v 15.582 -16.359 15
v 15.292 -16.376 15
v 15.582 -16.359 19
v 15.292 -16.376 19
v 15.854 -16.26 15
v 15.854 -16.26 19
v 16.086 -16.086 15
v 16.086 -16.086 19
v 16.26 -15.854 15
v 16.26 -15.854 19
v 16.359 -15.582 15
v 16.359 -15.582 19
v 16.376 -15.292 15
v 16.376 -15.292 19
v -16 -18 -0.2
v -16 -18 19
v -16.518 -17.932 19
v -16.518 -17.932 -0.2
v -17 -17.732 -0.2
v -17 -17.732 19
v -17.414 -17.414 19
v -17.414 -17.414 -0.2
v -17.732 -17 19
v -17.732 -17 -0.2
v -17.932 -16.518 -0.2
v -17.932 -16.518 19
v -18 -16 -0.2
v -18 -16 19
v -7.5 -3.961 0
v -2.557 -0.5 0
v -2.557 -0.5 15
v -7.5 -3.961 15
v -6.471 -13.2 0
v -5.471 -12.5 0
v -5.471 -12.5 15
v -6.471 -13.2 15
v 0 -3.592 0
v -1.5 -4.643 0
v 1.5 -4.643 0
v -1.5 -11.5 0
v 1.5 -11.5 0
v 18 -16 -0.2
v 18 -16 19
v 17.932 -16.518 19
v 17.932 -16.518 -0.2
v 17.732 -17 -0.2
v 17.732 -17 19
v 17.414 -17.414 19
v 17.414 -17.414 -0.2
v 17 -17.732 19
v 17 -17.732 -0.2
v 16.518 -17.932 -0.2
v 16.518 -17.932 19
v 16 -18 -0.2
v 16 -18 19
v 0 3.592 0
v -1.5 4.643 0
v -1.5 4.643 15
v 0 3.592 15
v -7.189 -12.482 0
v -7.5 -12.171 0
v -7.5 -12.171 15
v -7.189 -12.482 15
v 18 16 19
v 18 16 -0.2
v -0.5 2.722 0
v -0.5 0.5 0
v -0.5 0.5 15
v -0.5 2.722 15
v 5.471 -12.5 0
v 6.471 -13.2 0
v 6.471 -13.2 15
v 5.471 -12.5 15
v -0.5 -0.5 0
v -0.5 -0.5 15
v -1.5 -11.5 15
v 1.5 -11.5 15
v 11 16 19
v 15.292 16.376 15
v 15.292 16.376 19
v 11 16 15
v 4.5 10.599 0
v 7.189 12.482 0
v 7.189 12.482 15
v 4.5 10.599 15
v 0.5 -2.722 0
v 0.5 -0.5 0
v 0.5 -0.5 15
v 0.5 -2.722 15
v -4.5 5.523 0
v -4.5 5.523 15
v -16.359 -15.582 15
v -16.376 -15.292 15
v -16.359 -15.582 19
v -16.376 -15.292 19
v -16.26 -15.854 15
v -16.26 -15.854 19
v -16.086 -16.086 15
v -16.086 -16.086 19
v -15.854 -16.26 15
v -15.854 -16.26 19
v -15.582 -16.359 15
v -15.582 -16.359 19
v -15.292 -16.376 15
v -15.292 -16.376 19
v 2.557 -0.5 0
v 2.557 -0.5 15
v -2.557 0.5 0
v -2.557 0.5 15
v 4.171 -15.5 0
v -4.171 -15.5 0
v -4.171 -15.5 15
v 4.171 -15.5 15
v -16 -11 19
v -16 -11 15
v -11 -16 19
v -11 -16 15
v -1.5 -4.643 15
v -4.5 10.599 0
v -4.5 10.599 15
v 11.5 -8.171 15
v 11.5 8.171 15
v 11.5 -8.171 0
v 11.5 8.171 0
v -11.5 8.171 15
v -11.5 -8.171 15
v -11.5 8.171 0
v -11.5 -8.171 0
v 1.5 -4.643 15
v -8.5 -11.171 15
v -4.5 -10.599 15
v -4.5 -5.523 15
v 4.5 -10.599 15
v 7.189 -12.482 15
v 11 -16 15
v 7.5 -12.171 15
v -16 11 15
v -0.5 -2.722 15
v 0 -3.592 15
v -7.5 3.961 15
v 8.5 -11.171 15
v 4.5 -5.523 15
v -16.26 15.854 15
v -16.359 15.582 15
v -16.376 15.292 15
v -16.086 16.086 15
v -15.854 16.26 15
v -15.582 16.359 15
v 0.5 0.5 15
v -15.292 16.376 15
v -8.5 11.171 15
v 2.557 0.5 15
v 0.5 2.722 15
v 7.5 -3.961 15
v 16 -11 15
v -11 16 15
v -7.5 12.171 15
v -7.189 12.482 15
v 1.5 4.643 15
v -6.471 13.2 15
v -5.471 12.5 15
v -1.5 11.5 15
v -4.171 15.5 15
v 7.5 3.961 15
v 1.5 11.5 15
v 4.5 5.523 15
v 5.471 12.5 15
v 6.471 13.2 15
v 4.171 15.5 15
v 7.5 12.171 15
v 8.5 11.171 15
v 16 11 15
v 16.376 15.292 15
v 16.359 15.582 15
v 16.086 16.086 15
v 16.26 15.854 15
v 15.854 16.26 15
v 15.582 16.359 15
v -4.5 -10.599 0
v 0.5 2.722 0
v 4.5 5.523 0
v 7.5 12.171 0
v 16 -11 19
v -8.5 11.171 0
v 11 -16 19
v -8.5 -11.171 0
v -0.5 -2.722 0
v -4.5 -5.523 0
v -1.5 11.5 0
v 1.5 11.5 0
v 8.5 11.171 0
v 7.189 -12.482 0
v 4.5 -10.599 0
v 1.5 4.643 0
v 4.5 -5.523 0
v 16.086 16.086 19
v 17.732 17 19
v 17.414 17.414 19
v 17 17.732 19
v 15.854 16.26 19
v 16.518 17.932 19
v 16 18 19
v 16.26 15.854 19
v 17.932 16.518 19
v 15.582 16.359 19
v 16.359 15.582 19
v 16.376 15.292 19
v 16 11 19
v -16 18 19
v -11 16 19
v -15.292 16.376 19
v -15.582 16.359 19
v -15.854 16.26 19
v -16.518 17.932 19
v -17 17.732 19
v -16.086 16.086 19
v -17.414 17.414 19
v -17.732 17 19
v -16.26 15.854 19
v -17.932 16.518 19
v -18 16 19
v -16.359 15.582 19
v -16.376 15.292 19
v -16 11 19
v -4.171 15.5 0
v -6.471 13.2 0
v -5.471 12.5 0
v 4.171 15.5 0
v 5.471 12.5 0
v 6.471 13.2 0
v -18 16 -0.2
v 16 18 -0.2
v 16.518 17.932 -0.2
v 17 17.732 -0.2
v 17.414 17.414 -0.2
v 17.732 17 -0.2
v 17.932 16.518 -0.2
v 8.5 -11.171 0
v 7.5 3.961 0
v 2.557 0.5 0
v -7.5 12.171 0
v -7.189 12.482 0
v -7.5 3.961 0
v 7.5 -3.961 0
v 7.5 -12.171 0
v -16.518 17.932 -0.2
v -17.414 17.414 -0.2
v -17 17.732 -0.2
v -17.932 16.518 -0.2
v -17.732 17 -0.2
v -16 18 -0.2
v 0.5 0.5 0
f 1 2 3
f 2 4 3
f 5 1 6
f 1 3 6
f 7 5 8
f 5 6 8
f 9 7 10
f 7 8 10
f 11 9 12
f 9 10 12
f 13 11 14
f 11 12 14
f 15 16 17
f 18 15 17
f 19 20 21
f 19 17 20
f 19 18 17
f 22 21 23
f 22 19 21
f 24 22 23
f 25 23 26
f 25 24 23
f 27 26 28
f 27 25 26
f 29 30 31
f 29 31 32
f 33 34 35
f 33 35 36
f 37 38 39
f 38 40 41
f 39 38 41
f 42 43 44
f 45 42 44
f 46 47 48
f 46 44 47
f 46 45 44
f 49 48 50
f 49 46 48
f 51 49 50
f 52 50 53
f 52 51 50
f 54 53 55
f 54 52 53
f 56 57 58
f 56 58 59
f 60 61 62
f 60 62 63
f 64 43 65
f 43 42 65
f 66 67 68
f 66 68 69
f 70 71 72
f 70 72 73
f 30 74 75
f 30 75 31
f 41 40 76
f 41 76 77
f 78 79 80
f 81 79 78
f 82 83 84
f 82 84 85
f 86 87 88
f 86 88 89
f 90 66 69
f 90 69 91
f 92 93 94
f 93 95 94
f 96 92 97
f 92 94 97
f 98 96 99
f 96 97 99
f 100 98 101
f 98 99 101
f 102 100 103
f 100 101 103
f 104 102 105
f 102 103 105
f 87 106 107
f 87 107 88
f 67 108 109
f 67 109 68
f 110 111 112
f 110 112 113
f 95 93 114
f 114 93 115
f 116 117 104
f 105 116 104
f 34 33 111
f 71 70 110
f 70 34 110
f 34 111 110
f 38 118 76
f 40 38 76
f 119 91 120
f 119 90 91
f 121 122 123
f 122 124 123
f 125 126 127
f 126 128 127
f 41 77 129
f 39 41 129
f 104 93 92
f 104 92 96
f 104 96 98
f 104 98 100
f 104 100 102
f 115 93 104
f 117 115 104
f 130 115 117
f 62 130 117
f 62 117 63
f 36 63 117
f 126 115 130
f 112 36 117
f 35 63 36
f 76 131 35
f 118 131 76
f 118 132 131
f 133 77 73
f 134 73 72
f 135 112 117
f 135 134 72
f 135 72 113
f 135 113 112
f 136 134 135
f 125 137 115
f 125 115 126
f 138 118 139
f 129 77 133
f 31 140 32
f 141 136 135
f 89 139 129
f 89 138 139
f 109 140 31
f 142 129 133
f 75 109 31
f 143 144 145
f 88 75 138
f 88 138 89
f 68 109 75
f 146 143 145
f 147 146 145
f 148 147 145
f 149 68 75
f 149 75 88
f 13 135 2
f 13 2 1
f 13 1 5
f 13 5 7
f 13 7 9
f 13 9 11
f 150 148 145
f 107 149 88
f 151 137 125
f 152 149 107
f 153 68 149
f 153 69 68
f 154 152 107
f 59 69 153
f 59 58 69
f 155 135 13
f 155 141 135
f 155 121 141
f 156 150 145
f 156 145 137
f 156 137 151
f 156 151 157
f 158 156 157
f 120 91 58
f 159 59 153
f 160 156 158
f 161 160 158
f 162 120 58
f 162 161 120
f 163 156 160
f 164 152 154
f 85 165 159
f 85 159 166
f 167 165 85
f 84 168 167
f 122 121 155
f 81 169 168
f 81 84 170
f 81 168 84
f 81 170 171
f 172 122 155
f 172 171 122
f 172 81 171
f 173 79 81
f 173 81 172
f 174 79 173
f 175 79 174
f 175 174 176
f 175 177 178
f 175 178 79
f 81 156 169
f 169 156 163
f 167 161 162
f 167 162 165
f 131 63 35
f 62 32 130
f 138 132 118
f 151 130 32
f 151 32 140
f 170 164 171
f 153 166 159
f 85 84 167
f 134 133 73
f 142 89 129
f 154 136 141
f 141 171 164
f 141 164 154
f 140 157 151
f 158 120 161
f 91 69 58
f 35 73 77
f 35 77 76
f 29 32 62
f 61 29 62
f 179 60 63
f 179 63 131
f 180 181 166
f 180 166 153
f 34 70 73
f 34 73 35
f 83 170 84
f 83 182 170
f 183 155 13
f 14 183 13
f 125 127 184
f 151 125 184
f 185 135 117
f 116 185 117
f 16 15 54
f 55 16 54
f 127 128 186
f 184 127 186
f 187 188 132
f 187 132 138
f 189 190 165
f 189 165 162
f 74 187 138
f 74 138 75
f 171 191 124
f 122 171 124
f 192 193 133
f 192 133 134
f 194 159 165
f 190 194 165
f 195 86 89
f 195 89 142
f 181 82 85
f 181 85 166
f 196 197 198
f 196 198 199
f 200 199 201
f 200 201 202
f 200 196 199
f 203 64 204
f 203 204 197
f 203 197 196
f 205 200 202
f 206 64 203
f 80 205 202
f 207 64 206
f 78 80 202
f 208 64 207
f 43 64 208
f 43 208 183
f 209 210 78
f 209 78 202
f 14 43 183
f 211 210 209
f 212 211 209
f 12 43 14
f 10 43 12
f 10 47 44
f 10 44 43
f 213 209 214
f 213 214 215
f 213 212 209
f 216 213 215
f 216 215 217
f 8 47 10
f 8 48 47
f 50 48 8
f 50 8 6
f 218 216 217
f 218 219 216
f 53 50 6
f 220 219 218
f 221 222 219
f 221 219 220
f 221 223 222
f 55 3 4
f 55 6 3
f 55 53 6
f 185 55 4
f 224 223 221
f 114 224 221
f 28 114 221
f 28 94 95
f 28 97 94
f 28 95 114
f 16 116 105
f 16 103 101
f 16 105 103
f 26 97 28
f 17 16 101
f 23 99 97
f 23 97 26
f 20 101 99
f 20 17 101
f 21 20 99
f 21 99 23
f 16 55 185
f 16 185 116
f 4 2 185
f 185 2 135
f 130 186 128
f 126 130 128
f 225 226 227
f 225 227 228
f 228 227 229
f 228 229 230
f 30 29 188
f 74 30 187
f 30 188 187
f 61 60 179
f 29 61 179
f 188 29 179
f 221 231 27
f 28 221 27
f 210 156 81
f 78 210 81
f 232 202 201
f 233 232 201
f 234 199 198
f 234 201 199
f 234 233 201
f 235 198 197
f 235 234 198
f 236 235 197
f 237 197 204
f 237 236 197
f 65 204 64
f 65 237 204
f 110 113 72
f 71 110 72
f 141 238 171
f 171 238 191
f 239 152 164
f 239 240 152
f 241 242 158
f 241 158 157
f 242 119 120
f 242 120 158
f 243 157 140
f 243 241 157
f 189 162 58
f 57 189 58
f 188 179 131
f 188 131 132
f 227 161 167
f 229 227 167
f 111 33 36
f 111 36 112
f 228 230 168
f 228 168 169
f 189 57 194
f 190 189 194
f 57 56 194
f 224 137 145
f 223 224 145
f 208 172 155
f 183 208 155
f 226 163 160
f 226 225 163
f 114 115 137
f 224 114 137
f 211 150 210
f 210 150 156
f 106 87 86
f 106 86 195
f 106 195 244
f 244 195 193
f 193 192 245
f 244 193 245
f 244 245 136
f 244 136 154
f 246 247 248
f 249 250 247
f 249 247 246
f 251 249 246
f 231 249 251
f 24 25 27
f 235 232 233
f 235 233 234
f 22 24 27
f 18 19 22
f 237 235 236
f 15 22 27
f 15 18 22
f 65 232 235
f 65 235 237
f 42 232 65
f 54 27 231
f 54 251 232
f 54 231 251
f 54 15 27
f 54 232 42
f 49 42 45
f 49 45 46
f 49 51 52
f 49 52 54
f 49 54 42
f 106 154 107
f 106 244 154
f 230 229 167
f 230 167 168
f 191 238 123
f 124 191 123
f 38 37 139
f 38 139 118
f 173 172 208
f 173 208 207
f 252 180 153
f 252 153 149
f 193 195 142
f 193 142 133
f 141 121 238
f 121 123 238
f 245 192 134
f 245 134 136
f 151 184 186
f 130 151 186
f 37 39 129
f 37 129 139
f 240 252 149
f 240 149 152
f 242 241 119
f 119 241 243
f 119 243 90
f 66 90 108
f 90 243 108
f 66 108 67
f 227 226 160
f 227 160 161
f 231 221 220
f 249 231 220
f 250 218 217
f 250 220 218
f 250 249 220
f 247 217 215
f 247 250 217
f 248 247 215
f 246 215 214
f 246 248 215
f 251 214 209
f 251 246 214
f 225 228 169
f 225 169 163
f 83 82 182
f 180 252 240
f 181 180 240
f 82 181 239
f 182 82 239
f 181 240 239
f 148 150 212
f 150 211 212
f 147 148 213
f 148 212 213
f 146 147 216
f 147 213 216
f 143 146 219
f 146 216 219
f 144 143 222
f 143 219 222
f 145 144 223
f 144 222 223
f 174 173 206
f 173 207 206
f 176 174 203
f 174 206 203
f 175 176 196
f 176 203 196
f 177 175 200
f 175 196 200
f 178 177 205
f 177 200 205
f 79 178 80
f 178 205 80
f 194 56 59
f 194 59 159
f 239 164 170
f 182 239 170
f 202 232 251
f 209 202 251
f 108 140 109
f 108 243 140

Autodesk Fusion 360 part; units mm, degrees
sketch "8x8_led_matrix_display" plane through (0, 0, 0) normal (0, 0, 1) x (1, 0, 0)
  circle A0 centre (-14, 14) radius 1.5
  circle A1 centre (-10, 14) radius 1.5
  circle A2 centre (-6, 14) radius 1.5
  circle A3 centre (-2, 14) radius 1.5
  circle A4 centre (2, 14) radius 1.5
  circle A5 centre (6, 14) radius 1.5
  circle A6 centre (10, 14) radius 1.5
  circle A7 centre (14, 14) radius 1.5
  circle A8 centre (-14, 10) radius 1.5
  circle A9 centre (-10, 10) radius 1.5
  circle A10 centre (-6, 10) radius 1.5
  circle A11 centre (-2, 10) radius 1.5
  circle A12 centre (2, 10) radius 1.5
  circle A13 centre (6, 10) radius 1.5
  circle A14 centre (10, 10) radius 1.5
  circle A15 centre (14, 10) radius 1.5
  circle A16 centre (-14, 6) radius 1.5
  circle A17 centre (-10, 6) radius 1.5
  circle A18 centre (-6, 6) radius 1.5
  circle A19 centre (-2, 6) radius 1.5
  circle A20 centre (2, 6) radius 1.5
  circle A21 centre (6, 6) radius 1.5
  circle A22 centre (10, 6) radius 1.5
  circle A23 centre (14, 6) radius 1.5
  circle A24 centre (-14, 2) radius 1.5
  circle A25 centre (-10, 2) radius 1.5
  circle A26 centre (-6, 2) radius 1.5
  circle A27 centre (-2, 2) radius 1.5
  circle A28 centre (2, 2) radius 1.5
  circle A29 centre (6, 2) radius 1.5
  circle A30 centre (10, 2) radius 1.5
  circle A31 centre (14, 2) radius 1.5
  circle A32 centre (-14, -2) radius 1.5
  circle A33 centre (-10, -2) radius 1.5
  circle A34 centre (-6, -2) radius 1.5
  circle A35 centre (-2, -2) radius 1.5
  circle A36 centre (2, -2) radius 1.5
  circle A37 centre (6, -2) radius 1.5
  circle A38 centre (10, -2) radius 1.5
  circle A39 centre (14, -2) radius 1.5
  circle A40 centre (-14, -6) radius 1.5
  circle A41 centre (-10, -6) radius 1.5
  circle A42 centre (-6, -6) radius 1.5
  circle A43 centre (-2, -6) radius 1.5
  circle A44 centre (2, -6) radius 1.5
  circle A45 centre (6, -6) radius 1.5
  circle A46 centre (10, -6) radius 1.5
  circle A47 centre (14, -6) radius 1.5
  circle A48 centre (-14, -10) radius 1.5
  circle A49 centre (-10, -10) radius 1.5
  circle A50 centre (-6, -10) radius 1.5
  circle A51 centre (-2, -10) radius 1.5
  circle A52 centre (2, -10) radius 1.5
  circle A53 centre (6, -10) radius 1.5
  circle A54 centre (10, -10) radius 1.5
  circle A55 centre (14, -10) radius 1.5
  circle A56 centre (-14, -14) radius 1.5
  circle A57 centre (-10, -14) radius 1.5
  circle A58 centre (-6, -14) radius 1.5
  circle A59 centre (-2, -14) radius 1.5
  circle A60 centre (2, -14) radius 1.5
  circle A61 centre (6, -14) radius 1.5
  circle A62 centre (10, -14) radius 1.5
  circle A63 centre (14, -14) radius 1.5
  line L0 (16, -16) -> (-16, -16)
  line L1 (-16, -16) -> (-16, 16)
  line L2 (-16, 16) -> (16, 16)
  line L3 (16, 16) -> (16, -16)
  line L4 (16, -16) -> (-16, 16) construction
  line L5 (-16, -16) -> (16, 16) construction
  line L6 (18, -18) -> (-18, -18)
  line L7 (-18, -18) -> (-18, 18)
  line L8 (-18, 18) -> (18, 18)
  line L9 (18, 18) -> (18, -18)
  dimension "d1" = 3
  dimension "d2" = 14
  dimension "d3" = 14
  dimension "d6" = 28
  dimension "d7" = -28
  dimension "d8" = 32
  dimension "d9" = 32
  dimension "d33" = -2
sketch "segments" plane through (0, 0, 0) normal (0, 0, 1) x (1, 0, 0)
  line L0 (0, 0) -> (-16, 0)
  line L1 (-16, 0) -> (-16, 16)
  line L2 (-16, 16) -> (0, 16)
  line L3 (0, 16) -> (0, 0)
  line L4 (-11.5, 0) -> (-11.5, 8.1712)
  line L5 (-11.5, 8.1712) -> (-8.5, 11.1712)
  line L6 (-8.5, 11.1712) -> (-8.5, 0)
  line L7 (-7.5, 12.1712) -> (-7.5, 3.961)
  line L8 (-7.5, 3.961) -> (-2.5572, 0.5)
  line L9 (-2.5572, 0.5) -> (-0.5, 0.5)
  line L10 (-0.5, 0.5) -> (-0.5, 2.7218)
  line L11 (-0.5, 2.7218) -> (-4.5, 5.5227)
  line L12 (-4.5, 5.5227) -> (-4.5, 10.5993)
  line L13 (-4.5, 10.5993) -> (-7.189, 12.4822)
  line L14 (-7.189, 12.4822) -> (-7.5, 12.1712)
  line L15 (0, 11.5) -> (-1.5, 11.5)
  line L16 (-1.5, 11.5) -> (-1.5, 4.6428)
  line L17 (-1.5, 4.6428) -> (0, 3.5925)
  line L18 (0, 15.5) -> (-4.1712, 15.5)
  line L19 (-4.1712, 15.5) -> (-6.471, 13.2002)
  line L20 (-6.471, 13.2002) -> (-5.471, 12.5)
  line L21 (-5.471, 12.5) -> (0, 12.5)
  dimension "d10" = 16
  dimension "d11" = 16
  dimension "d12" = 3
  dimension "d13" = 8.5
  dimension "d14" = 3
  dimension "d15" = 3
  dimension "d16" = 0.5
  dimension "d17" = 0.5
  dimension "d18" = 1
  dimension "d19" = 1.5
  dimension "d20" = 11.5
  dimension "d21" = 1
  dimension "d22" = 3
  dimension "d23" = 15.5
  dimension "d24" = 1
  dimension "d25" = 45
  dimension "d26" = 125
extrude "Extrude1" add sketch "segments" along normal blind 15 contours L0 L1 L2 L3 L4 L5 L6 L15 L16 L17 L18 L19 L20 L21
mirror "Mirror1" about plane through (0, 0, 0) normal (1, 0, 0) of bodies 1 merged
mirror "Mirror2" about plane through (0, 0, 0) normal (0, 1, 0) of bodies 1 merged
extrude "Extrude2" add sketch "8x8_led_matrix_display" along normal blind 15 contours L6 L7 L8 L9
fillet "Fillet1" radius 2 4 edges at (-18, -18, 7.5) (18, -18, 7.5) (18, 18, 7.5) (-18, 18, 7.5)
sketch "projected_for_diffuser" plane through (0, 0, 0) normal (0, 0, -1) x (1, 0, 0)
  arc A0 (-18, -16) -> (-16, -18) centre (-16, -16) ccw
  line L0 (-16, -18) -> (16, -18)
  arc A1 (16, -18) -> (18, -16) centre (16, -16) ccw
  line L1 (18, -16) -> (18, 16)
  arc A2 (18, 16) -> (16, 18) centre (16, 16) ccw
  line L2 (16, 18) -> (-16, 18)
  arc A3 (-16, 18) -> (-18, 16) centre (-16, 16) ccw
  line L3 (-18, 16) -> (-18, -16)
  line L4 (11.5, 8.1712) -> (11.5, -8.1712)
  line L5 (11.5, -8.1712) -> (8.5, -11.1712)
  line L6 (8.5, -11.1712) -> (8.5, 11.1712)
  line L7 (8.5, 11.1712) -> (11.5, 8.1712)
  line L8 (-7.5, 12.1712) -> (-7.189, 12.4822)
  line L9 (-7.189, 12.4822) -> (-4.5, 10.5993)
  line L10 (-4.5, 10.5993) -> (-4.5, 5.5227)
  line L11 (-4.5, 5.5227) -> (-0.5, 2.7218)
  line L12 (-0.5, 2.7218) -> (-0.5, 0.5)
  line L13 (-0.5, 0.5) -> (-2.5572, 0.5)
  line L14 (-2.5572, 0.5) -> (-7.5, 3.961)
  line L15 (-7.5, 3.961) -> (-7.5, 12.1712)
  line L16 (7.189, 12.4822) -> (7.5, 12.1712)
  line L17 (7.5, 12.1712) -> (7.5, 3.961)
  line L18 (7.5, 3.961) -> (2.5572, 0.5)
  line L19 (2.5572, 0.5) -> (0.5, 0.5)
  line L20 (0.5, 0.5) -> (0.5, 2.7218)
  line L21 (0.5, 2.7218) -> (4.5, 5.5227)
  line L22 (4.5, 5.5227) -> (4.5, 10.5993)
  line L23 (4.5, 10.5993) -> (7.189, 12.4822)
  line L24 (-1.5, 11.5) -> (1.5, 11.5)
  line L25 (1.5, 11.5) -> (1.5, 4.6428)
  line L26 (1.5, 4.6428) -> (0, 3.5925)
  line L27 (0, 3.5925) -> (-1.5, 4.6428)
  line L28 (-1.5, 4.6428) -> (-1.5, 11.5)
  line L29 (-4.1712, 15.5) -> (4.1712, 15.5)
  line L30 (4.1712, 15.5) -> (6.471, 13.2002)
  line L31 (6.471, 13.2002) -> (5.471, 12.5)
  line L32 (5.471, 12.5) -> (-5.471, 12.5)
  line L33 (-5.471, 12.5) -> (-6.471, 13.2002)
  line L34 (-6.471, 13.2002) -> (-4.1712, 15.5)
  line L35 (4.1712, -15.5) -> (-4.1712, -15.5)
  line L36 (-4.1712, -15.5) -> (-6.471, -13.2002)
  line L37 (-6.471, -13.2002) -> (-5.471, -12.5)
  line L38 (-5.471, -12.5) -> (5.471, -12.5)
  line L39 (5.471, -12.5) -> (6.471, -13.2002)
  line L40 (6.471, -13.2002) -> (4.1712, -15.5)
  line L41 (1.5, -11.5) -> (-1.5, -11.5)
  line L42 (-1.5, -11.5) -> (-1.5, -4.6428)
  line L43 (-1.5, -4.6428) -> (0, -3.5925)
  line L44 (0, -3.5925) -> (1.5, -4.6428)
  line L45 (1.5, -4.6428) -> (1.5, -11.5)
  line L46 (7.5, -12.1712) -> (7.189, -12.4822)
  line L47 (7.189, -12.4822) -> (4.5, -10.5993)
  line L48 (4.5, -10.5993) -> (4.5, -5.5227)
  line L49 (4.5, -5.5227) -> (0.5, -2.7218)
  line L50 (0.5, -2.7218) -> (0.5, -0.5)
  line L51 (0.5, -0.5) -> (2.5572, -0.5)
  line L52 (2.5572, -0.5) -> (7.5, -3.961)
  line L53 (7.5, -3.961) -> (7.5, -12.1712)
  line L54 (-7.189, -12.4822) -> (-7.5, -12.1712)
  line L55 (-7.5, -12.1712) -> (-7.5, -3.961)
  line L56 (-7.5, -3.961) -> (-2.5572, -0.5)
  line L57 (-2.5572, -0.5) -> (-0.5, -0.5)
  line L58 (-0.5, -0.5) -> (-0.5, -2.7218)
  line L59 (-0.5, -2.7218) -> (-4.5, -5.5227)
  line L60 (-4.5, -5.5227) -> (-4.5, -10.5993)
  line L61 (-4.5, -10.5993) -> (-7.189, -12.4822)
  line L62 (-11.5, -8.1712) -> (-11.5, 8.1712)
  line L63 (-11.5, 8.1712) -> (-8.5, 11.1712)
  line L64 (-8.5, 11.1712) -> (-8.5, -11.1712)
  line L65 (-8.5, -11.1712) -> (-11.5, -8.1712)
extrude "Extrude3" add sketch "projected_for_diffuser" along normal blind 0.2 contours A0 L0 A1 L1 A2 L2 A3 L3 | L4 L5 L6 L7 | L8 L9 L10 L11 L12 L13 L14 L15 | L16 L17 L18 L19 L20 L21 L22 L23 | L24 L25 L26 L27 L28 | L29 L30 L31 L32 L33 L34 | L35 L36 L37 L38 L39 L40 | L41 L42 L43 L44 L45 | L46 L47 L48 L49 L50 L51 L52 L53 | L54 L55 L56 L57 L58 L59 L60 L61 | L62 L63 L64 L65
sketch "grip_for_display" plane through (0, 0, 15) normal (0, 0, 1) x (-1, 0, 0)
  line L0 (16, -16) -> (-16, -16)
  line L1 (-16, -16) -> (-16, 16)
  line L2 (-16, 16) -> (16, 16)
  line L3 (16, 16) -> (16, -16)
  line L4 (16, -16) -> (-16, 16) construction
  line L5 (-16, -16) -> (16, 16) construction
  line L6 (16, -11) -> (-16, -11)
  line L7 (-16, -11) -> (-16, 11)
  line L8 (-16, 11) -> (16, 11)
  line L9 (16, 11) -> (16, -11)
  line L10 (16, -11) -> (-16, 11) construction
  line L11 (-16, -11) -> (16, 11) construction
  line L12 (11, -16) -> (-11, -16)
  line L13 (-11, -16) -> (-11, 16)
  line L14 (-11, 16) -> (11, 16)
  line L15 (11, 16) -> (11, -16)
  line L16 (11, -16) -> (-11, 16) construction
  line L17 (-11, -16) -> (11, 16) construction
  line L18 (-16, 11) -> (-16.4794, 16.4794)
  line L19 (-16.4794, 16.4794) -> (-11, 16)
  line L20 (11, 16) -> (16.4794, 16.4794)
  line L21 (16.4794, 16.4794) -> (16, 11)
  line L22 (16, -11) -> (16.4794, -16.4794)
  line L23 (16.4794, -16.4794) -> (11, -16)
  line L24 (-16, -11) -> (-16.4794, -16.4794)
  line L25 (-16.4794, -16.4794) -> (-11, -16)
  line L26 (-16, -18) -> (16, -18)
  arc A0 (-18, -16) -> (-16, -18) centre (-16, -16) ccw
  line L27 (-18, 16) -> (-18, -16)
  arc A1 (-16, 18) -> (-18, 16) centre (-16, 16) ccw
  line L28 (16, 18) -> (-16, 18)
  arc A2 (18, 16) -> (16, 18) centre (16, 16) ccw
  line L29 (18, -16) -> (18, 16)
  arc A3 (16, -18) -> (18, -16) centre (16, -16) ccw
  dimension "d40" = 32
  dimension "d41" = 32
  dimension "d42" = 32
  dimension "d43" = 22
  dimension "d44" = 22
  dimension "d45" = 32
  dimension "d46" = 80
extrude "Extrude4" add sketch "grip_for_display" along normal blind 4
fillet "Fillet2" radius 1 4 edges at (16.4794, -16.4794, 17) (-16.4794, -16.4794, 17) (-16.4794, 16.4794, 17) (16.4794, 16.4794, 17)
fillet "Fillet2" radius 5 8 edges at (16, -11, 17) (11, -16, 17) (-11, -16, 17) (-16, -11, 17) (-16, 11, 17) (-11, 16, 17) (11, 16, 17) (16, 11, 17)
equation "d2 = ( 3.5 * 4 ) * 1 mm"
equation "d3 = ( 3.5 * 4 ) * 1 mm"
equation "d6 = ( 4 * 7 ) * 1 mm"
equation "d7 = ( -4 * 7 ) * 1 mm"
